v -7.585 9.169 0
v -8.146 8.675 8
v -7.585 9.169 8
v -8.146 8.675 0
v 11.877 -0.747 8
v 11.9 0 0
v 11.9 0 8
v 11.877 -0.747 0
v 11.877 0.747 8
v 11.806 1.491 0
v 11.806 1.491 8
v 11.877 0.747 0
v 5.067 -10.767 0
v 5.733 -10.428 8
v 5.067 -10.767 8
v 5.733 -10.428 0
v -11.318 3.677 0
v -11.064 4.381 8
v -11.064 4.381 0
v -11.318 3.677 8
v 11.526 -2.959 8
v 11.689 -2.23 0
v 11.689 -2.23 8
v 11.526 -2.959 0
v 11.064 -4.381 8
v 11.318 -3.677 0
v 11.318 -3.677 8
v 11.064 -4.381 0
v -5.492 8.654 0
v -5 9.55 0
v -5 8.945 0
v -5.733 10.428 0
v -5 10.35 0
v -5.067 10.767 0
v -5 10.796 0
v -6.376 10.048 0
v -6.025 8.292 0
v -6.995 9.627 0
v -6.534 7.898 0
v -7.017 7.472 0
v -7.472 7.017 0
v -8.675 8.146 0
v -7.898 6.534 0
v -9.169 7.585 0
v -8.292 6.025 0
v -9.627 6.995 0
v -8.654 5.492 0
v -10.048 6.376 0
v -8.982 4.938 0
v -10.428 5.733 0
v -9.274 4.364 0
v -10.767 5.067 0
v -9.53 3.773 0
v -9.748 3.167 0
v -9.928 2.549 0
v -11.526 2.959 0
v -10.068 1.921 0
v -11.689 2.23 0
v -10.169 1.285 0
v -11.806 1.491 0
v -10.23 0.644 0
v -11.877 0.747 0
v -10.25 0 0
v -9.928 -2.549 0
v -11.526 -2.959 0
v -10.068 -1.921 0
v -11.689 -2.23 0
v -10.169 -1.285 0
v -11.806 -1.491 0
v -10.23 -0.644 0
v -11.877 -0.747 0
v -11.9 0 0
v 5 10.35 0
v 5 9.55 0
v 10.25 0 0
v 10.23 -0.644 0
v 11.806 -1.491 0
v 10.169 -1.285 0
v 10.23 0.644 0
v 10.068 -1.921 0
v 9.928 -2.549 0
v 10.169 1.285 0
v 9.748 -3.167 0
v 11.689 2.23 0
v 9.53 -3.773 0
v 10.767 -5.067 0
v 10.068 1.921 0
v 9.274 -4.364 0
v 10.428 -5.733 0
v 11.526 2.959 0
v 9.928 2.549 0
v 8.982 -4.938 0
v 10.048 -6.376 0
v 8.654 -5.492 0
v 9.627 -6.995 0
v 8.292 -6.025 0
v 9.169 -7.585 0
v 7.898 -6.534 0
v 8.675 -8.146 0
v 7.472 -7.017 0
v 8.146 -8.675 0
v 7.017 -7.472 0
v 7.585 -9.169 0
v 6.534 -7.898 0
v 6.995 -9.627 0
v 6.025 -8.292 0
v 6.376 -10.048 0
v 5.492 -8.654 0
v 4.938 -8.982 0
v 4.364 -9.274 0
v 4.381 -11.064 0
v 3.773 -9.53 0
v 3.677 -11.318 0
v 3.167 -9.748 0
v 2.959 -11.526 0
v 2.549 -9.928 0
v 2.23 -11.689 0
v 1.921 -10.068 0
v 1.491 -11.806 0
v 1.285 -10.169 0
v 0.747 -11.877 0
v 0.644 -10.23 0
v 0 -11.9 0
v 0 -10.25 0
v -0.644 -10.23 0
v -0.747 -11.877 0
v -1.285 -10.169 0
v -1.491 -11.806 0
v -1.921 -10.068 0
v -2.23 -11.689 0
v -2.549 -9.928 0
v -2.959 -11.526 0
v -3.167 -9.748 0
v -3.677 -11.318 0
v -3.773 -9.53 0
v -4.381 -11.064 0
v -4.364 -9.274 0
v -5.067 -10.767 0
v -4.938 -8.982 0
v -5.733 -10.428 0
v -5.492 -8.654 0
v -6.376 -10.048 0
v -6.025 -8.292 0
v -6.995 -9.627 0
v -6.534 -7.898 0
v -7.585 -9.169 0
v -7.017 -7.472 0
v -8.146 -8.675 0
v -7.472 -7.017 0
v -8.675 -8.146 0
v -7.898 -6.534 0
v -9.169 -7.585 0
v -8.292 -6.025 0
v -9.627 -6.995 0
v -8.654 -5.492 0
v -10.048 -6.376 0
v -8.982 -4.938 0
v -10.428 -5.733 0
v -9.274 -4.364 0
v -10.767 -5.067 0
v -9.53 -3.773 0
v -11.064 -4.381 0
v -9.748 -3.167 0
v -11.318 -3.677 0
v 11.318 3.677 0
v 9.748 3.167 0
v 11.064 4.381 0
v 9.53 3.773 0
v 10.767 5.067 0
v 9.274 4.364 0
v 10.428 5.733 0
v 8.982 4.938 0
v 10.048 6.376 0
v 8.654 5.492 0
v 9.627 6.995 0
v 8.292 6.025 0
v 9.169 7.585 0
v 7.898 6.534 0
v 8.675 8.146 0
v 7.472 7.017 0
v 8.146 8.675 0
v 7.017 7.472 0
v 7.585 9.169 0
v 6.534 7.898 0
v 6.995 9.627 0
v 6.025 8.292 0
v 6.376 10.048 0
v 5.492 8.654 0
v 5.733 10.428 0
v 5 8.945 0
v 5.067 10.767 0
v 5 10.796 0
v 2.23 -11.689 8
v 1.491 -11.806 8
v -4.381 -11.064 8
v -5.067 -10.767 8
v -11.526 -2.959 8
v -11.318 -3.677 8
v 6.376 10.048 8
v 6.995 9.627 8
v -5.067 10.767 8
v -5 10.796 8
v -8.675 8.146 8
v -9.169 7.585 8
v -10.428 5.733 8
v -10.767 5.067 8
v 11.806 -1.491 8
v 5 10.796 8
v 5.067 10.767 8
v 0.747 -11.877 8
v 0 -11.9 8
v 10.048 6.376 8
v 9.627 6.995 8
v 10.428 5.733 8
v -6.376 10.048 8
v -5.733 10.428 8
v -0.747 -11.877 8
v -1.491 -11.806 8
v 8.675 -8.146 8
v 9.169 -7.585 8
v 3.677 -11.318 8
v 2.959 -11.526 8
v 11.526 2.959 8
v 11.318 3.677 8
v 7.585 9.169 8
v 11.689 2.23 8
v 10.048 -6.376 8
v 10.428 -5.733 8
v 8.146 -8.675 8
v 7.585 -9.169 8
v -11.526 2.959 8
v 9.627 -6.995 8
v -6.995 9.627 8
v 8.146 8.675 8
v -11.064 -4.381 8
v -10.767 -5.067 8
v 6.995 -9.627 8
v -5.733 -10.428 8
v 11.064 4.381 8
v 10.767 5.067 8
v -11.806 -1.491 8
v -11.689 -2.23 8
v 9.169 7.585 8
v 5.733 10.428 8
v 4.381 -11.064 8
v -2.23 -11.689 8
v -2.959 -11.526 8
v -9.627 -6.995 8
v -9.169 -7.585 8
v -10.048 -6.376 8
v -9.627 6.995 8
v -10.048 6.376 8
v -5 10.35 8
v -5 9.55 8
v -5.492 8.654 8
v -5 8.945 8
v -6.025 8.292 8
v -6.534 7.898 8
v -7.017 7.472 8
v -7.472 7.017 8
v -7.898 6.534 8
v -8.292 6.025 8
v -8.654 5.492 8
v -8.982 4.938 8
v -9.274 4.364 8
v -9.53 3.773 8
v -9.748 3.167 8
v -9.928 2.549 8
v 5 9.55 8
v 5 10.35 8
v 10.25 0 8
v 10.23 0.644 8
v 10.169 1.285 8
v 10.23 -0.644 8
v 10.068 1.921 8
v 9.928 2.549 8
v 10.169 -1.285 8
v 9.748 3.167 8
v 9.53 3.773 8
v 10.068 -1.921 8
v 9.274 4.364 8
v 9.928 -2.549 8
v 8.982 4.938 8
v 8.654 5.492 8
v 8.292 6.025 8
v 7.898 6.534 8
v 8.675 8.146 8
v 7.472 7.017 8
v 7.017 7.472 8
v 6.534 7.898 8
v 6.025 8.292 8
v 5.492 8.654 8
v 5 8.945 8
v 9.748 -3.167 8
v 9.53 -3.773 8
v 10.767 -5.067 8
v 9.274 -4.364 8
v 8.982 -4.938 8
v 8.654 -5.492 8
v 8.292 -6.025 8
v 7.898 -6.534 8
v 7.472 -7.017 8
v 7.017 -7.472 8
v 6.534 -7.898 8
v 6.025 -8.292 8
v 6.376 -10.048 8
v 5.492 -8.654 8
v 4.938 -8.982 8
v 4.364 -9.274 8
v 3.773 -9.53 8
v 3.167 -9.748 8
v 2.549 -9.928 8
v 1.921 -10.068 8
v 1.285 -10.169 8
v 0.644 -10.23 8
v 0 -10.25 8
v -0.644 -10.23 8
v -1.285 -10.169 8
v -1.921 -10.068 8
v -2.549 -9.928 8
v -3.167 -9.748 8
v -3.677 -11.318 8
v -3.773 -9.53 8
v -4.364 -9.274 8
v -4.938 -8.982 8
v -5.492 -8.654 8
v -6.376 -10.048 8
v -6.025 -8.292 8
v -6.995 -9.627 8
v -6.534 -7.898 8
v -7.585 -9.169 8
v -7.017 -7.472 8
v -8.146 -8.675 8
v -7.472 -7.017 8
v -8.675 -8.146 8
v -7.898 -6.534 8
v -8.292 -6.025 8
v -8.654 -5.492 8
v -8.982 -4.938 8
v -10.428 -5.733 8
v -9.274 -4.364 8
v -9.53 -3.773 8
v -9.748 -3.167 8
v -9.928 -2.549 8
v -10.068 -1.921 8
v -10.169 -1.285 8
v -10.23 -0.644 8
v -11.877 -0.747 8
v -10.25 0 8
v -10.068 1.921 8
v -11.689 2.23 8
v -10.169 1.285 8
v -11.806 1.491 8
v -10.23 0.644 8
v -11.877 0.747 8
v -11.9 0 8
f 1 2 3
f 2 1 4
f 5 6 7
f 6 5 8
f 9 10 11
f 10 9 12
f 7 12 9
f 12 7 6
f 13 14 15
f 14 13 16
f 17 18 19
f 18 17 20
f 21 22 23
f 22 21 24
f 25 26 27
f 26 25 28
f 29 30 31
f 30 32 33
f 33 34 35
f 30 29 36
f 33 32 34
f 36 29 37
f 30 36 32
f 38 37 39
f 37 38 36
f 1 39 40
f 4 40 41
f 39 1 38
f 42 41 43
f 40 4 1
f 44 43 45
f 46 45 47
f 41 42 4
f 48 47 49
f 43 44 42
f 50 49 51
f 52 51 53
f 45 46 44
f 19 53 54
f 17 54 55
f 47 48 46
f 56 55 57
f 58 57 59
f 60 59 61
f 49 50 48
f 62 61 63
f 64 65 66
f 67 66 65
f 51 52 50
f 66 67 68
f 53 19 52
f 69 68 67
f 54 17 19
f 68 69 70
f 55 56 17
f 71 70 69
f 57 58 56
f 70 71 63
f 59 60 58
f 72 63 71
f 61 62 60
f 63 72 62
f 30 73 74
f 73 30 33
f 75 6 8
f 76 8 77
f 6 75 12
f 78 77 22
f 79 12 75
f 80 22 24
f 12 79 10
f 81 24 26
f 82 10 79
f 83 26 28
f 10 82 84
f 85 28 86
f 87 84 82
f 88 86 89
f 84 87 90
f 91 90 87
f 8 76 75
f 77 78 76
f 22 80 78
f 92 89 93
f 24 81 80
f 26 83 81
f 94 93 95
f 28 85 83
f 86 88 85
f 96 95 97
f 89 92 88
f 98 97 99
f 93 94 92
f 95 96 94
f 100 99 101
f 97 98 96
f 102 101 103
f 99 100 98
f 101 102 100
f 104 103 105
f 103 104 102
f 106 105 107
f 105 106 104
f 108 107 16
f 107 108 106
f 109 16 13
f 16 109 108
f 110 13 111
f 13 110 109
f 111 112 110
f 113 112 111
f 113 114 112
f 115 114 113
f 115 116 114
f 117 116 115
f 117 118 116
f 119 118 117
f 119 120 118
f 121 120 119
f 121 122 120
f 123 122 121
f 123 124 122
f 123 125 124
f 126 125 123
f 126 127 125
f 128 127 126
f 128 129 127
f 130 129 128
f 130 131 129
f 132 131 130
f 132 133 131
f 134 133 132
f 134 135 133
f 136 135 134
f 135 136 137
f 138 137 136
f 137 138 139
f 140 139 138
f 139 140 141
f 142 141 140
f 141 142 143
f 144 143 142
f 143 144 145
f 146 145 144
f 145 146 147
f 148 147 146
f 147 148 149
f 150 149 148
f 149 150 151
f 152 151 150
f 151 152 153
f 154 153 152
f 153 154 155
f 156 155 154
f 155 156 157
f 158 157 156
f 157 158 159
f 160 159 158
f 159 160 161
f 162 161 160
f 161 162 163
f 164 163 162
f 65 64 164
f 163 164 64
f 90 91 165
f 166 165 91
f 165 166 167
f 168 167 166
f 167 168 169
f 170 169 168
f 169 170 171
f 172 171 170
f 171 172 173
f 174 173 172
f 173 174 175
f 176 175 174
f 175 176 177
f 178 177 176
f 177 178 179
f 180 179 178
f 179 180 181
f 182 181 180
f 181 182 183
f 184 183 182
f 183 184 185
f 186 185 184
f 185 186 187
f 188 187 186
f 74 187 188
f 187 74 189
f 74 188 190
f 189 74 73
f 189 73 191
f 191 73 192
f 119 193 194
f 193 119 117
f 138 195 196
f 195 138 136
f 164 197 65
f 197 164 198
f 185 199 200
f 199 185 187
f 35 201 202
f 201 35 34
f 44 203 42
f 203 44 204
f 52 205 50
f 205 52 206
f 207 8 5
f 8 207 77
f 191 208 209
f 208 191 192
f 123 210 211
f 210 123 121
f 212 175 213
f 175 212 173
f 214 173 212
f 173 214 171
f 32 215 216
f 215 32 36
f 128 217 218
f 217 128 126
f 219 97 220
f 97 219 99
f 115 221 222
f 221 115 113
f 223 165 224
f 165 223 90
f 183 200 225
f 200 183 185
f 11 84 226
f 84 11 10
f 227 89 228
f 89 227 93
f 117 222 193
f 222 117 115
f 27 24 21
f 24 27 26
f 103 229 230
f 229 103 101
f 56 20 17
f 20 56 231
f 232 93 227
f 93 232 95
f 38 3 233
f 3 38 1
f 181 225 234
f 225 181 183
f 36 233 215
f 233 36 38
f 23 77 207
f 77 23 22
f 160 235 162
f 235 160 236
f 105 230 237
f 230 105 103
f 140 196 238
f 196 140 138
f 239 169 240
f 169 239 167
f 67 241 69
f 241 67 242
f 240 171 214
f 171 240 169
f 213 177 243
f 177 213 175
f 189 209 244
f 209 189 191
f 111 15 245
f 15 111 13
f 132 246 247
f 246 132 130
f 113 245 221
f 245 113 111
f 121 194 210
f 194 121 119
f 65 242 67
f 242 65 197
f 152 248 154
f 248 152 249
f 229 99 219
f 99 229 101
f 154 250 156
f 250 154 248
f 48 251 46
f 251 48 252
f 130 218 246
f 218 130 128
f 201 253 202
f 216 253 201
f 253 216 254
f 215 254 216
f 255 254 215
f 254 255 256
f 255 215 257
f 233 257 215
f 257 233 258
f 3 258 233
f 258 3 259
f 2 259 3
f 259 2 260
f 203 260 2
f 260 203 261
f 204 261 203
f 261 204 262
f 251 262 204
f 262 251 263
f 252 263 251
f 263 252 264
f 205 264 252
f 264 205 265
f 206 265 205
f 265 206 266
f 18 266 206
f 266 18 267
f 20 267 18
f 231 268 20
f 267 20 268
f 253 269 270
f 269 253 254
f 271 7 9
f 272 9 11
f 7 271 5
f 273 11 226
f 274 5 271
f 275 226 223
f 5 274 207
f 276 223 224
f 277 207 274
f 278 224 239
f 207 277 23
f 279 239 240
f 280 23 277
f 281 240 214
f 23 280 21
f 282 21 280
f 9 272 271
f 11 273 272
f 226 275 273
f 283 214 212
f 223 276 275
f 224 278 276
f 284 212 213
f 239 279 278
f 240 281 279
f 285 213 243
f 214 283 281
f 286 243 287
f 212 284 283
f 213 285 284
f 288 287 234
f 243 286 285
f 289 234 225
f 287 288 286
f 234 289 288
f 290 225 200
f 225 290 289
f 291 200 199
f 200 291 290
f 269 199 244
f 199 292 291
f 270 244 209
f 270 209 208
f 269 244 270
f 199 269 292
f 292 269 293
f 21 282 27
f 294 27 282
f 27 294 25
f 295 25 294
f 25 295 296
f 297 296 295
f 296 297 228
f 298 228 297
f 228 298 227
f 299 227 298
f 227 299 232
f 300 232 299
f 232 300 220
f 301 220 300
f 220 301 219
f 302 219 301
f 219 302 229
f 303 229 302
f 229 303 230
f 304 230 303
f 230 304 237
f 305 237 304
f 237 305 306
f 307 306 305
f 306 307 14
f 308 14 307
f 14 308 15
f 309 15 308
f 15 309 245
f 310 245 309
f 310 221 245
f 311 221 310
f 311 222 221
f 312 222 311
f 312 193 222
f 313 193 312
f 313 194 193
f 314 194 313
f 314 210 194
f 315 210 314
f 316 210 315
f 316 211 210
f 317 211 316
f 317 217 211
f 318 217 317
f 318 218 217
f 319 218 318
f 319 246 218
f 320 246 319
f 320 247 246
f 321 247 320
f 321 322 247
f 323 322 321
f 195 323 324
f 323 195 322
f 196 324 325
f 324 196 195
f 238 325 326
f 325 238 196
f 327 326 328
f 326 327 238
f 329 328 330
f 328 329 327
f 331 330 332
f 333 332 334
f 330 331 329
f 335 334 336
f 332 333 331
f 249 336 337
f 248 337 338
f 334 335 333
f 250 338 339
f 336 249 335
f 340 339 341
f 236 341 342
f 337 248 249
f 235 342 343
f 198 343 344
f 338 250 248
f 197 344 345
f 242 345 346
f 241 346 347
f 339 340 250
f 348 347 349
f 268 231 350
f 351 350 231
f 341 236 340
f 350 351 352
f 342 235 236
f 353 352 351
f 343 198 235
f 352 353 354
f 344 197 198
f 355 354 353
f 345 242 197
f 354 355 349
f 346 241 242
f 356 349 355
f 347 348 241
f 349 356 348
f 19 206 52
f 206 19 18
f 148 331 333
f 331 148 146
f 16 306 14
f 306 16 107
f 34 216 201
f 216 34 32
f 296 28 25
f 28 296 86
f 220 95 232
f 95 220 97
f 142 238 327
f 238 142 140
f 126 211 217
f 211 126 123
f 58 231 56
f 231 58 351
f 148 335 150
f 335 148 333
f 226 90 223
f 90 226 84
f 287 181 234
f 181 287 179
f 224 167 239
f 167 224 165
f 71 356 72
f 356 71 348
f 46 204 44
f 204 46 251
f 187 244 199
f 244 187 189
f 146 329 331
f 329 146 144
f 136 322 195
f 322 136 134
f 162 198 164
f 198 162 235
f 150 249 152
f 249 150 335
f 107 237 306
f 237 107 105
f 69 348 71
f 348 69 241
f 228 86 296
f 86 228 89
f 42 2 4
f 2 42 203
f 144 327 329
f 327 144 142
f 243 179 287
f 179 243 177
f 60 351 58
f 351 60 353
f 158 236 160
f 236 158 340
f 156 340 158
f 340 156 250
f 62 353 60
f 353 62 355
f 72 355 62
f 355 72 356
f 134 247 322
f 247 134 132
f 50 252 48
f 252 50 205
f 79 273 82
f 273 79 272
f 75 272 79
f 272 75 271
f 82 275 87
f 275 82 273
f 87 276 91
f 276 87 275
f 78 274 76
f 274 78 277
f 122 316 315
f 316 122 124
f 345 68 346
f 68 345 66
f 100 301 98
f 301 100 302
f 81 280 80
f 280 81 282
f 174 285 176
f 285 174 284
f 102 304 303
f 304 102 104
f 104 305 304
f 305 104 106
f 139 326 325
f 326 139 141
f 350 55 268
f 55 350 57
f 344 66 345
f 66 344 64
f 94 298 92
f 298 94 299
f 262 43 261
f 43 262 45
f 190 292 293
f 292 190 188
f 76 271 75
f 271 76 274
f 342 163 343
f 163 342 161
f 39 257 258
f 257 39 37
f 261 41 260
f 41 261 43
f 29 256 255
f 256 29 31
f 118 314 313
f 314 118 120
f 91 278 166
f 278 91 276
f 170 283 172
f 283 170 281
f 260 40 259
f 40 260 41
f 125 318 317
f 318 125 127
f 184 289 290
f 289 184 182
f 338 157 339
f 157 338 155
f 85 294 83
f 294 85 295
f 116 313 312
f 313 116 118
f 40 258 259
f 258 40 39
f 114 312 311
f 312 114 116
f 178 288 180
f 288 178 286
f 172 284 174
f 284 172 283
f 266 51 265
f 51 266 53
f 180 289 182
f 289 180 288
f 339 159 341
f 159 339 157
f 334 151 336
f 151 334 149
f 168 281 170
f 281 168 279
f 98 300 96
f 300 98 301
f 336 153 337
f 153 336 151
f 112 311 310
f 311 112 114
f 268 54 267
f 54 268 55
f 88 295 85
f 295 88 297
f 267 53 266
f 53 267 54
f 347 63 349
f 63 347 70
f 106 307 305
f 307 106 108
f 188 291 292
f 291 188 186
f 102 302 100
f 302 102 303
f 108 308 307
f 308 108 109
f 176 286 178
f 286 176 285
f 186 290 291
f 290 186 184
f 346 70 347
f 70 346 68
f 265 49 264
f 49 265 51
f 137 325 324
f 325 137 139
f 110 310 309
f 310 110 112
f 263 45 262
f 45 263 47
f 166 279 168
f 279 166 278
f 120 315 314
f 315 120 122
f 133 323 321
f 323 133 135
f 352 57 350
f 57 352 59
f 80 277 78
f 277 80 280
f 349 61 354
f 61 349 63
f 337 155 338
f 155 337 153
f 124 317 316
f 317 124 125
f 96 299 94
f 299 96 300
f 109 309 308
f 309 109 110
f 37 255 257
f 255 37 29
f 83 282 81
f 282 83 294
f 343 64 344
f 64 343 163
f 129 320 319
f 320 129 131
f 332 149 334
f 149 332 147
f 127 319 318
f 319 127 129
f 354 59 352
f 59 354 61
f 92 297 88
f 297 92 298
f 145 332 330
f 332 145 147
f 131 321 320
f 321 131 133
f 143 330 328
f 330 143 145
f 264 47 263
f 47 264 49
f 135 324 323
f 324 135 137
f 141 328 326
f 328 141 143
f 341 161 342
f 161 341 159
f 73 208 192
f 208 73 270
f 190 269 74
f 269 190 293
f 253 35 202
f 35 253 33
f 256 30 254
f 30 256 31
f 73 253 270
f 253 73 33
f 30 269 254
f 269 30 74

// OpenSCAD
ringInnerDiameter = 20.5; //19.5;
ringThickness = 1.65;
ringOuterDiameter = ringInnerDiameter + ringThickness * 2;
ringWidth = 8;

cutHeight = 8;
cutterWidth = 10;

innerWallHeight = 0.8;
innerWallWidth = cutterWidth;

difference() {
    cylinder(h=ringWidth, r=ringOuterDiameter / 2, $fn=100); // outer cylinder     
    cylinder(h=ringWidth * 69, r=ringInnerDiameter / 2, $fn=100); // inner cylinder
    
    translate([-cutterWidth/2, 0, 0]) {
        cube([cutterWidth, 100, ringWidth]);
    }

}
translate([-innerWallWidth/2, ringInnerDiameter/2 - 0.7, 0]) { // use maths?
    cube([innerWallWidth, innerWallHeight, ringWidth]);
}
